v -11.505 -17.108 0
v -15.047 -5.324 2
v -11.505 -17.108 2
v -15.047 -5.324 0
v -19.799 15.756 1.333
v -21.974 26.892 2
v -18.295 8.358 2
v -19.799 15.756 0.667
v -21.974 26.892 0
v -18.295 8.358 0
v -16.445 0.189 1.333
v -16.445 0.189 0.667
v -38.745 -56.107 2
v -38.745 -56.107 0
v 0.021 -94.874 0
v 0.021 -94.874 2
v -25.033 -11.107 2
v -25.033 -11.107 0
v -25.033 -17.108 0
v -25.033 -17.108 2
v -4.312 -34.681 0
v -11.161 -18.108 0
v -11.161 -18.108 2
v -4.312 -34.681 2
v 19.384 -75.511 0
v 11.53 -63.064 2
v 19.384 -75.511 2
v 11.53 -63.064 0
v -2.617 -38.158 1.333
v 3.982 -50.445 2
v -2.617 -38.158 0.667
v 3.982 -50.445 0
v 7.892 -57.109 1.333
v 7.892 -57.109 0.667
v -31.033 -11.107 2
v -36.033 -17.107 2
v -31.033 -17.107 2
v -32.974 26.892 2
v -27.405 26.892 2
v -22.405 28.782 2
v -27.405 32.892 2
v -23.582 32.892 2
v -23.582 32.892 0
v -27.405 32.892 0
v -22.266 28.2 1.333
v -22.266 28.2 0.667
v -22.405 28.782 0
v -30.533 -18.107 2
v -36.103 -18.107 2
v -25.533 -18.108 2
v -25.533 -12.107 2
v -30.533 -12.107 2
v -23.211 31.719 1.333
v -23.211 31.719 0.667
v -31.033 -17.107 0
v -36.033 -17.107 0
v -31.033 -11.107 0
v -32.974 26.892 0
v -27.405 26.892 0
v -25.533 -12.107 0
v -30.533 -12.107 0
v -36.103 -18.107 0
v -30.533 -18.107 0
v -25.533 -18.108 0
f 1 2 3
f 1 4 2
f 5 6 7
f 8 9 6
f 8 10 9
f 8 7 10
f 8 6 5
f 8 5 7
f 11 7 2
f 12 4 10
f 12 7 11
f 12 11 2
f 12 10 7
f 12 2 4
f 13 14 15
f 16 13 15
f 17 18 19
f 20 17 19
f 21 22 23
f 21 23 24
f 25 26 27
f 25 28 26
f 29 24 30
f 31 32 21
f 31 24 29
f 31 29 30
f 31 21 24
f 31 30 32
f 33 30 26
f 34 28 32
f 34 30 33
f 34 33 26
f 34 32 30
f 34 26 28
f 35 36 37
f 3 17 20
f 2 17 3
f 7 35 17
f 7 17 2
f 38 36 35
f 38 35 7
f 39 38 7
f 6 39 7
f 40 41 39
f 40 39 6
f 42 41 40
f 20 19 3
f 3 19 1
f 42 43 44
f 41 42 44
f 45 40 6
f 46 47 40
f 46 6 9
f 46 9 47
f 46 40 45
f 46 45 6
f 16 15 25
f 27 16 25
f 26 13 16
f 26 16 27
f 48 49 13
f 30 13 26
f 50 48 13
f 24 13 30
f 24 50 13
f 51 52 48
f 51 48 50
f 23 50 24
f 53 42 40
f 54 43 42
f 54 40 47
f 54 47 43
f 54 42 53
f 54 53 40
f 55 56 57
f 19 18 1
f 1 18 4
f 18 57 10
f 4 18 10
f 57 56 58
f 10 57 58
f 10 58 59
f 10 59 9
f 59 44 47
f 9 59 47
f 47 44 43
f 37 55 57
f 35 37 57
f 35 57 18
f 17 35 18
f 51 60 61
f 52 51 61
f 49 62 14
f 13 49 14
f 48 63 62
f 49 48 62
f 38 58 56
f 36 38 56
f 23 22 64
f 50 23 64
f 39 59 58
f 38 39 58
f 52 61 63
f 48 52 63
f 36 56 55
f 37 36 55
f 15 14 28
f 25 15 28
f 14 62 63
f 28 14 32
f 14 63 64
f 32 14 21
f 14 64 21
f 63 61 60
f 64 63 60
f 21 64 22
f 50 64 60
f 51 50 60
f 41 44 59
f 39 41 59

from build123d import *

# Parameters (mm, degrees)
F1_DEPTH = 2


with BuildPart() as f1:
    # F0 (on Top) → F1 (new body)
    with BuildSketch(Plane.XY):
        with BuildLine():
            Line((-36.1030085053, -18.1074753944), (-38.7452475978, -56.1074753944))
            Line((-38.7452475978, -56.1074753944), (0.0209415142, -94.8736645064))
            Line((0.0209415142, -94.8736645064), (19.383590258, -75.5110157627))
            add(Edge.make_bspline(
                [(-11.1606838182, -18.1079245215), (-3.9272930935, -38.8901161994), (7.7283923455, -57.2005538635), (19.383590258, -75.5110157627)],
                knots=[0.5354752701, 0.5354752701, 0.5354752701, 0.5354752701, 1, 1, 1, 1], degree=3))
            Line((-11.1606838182, -18.1079245215), (-25.5334842512, -18.1079245215))
            Line((-25.5334842512, -18.1079245215), (-25.5334842512, -12.1074753944))
            Line((-25.5334842512, -12.1074753944), (-30.5334842512, -12.1074753944))
            Line((-30.5334842512, -12.1074753944), (-30.5334842512, -18.1074753944))
            Line((-30.5334842512, -18.1074753944), (-36.1030085053, -18.1074753944))
        make_face()
    extrude(amount=F1_DEPTH)


with BuildPart() as f1b:
    # F0 (on Top) → F1, piece 2 (new body)
    with BuildSketch(Plane.XY):
        with BuildLine():
            Line((-25.0334758969, -17.1079245215), (-11.5047290727, -17.1079056856))
            add(Edge.make_bspline(
                [(-21.9740723878, 26.8920754785), (-20.2514084677, 18.872572648), (-17.3749052233, 0.1533534673), (-11.5047290727, -17.1079056856)],
                knots=[0.1435758268, 0.1435758268, 0.1435758268, 0.1435758268, 0.5280379508, 0.5280379508, 0.5280379508, 0.5280379508], degree=3))
            Line((-21.9740723878, 26.8920754785), (-22.404534184, 26.8920754785))
            Line((-22.404534184, 26.8920754785), (-27.404534184, 26.8920754785))
            Line((-27.404534184, 26.8920754785), (-32.9740723878, 26.8920754785))
            Line((-32.9740723878, 26.8920754785), (-36.0334758976, -17.1074753944))
            Line((-36.0334758976, -17.1074753944), (-31.0334758976, -17.1074753944))
            Line((-31.0334758976, -17.1074753944), (-31.0334842512, -11.1074753944))
            Line((-31.0334842512, -11.1074753944), (-25.0334842513, -11.1074670407))
            Line((-25.0334842513, -11.1074670407), (-25.0334758969, -17.1079245215))
        make_face()
        with BuildLine():
            Line((-22.404534184, 26.8920754785), (-21.9740723878, 26.8920754785))
            add(Edge.make_bspline(
                [(-22.404534184, 28.7817309061), (-22.2685909811, 28.2218066684), (-22.1258076558, 27.598447393), (-21.9740723878, 26.8920754785)],
                knots=[0.1097117267, 0.1097117267, 0.1097117267, 0.1097117267, 0.1435758268, 0.1435758268, 0.1435758268, 0.1435758268], degree=3))
            Line((-22.404534184, 28.7817309061), (-22.404534184, 26.8920754785))
        make_face()
        with BuildLine():
            Line((-27.404534184, 26.8920754785), (-22.404534184, 26.8920754785))
            Line((-22.404534184, 26.8920754785), (-22.404534184, 28.7817309061))
            add(Edge.make_bspline(
                [(-23.5822349949, 32.8920754785), (-23.213587795, 31.7439577547), (-22.8449582167, 30.5957538617), (-22.404534184, 28.7817309061)],
                knots=[0, 0, 0, 0, 0.1097117267, 0.1097117267, 0.1097117267, 0.1097117267], degree=3))
            Line((-23.5822349949, 32.8920754785), (-27.404534184, 32.8920754785))
            Line((-27.404534184, 32.8920754785), (-27.404534184, 26.8920754785))
        make_face()
    extrude(amount=F1_DEPTH)


solid = Compound([f1.part, f1b.part])
